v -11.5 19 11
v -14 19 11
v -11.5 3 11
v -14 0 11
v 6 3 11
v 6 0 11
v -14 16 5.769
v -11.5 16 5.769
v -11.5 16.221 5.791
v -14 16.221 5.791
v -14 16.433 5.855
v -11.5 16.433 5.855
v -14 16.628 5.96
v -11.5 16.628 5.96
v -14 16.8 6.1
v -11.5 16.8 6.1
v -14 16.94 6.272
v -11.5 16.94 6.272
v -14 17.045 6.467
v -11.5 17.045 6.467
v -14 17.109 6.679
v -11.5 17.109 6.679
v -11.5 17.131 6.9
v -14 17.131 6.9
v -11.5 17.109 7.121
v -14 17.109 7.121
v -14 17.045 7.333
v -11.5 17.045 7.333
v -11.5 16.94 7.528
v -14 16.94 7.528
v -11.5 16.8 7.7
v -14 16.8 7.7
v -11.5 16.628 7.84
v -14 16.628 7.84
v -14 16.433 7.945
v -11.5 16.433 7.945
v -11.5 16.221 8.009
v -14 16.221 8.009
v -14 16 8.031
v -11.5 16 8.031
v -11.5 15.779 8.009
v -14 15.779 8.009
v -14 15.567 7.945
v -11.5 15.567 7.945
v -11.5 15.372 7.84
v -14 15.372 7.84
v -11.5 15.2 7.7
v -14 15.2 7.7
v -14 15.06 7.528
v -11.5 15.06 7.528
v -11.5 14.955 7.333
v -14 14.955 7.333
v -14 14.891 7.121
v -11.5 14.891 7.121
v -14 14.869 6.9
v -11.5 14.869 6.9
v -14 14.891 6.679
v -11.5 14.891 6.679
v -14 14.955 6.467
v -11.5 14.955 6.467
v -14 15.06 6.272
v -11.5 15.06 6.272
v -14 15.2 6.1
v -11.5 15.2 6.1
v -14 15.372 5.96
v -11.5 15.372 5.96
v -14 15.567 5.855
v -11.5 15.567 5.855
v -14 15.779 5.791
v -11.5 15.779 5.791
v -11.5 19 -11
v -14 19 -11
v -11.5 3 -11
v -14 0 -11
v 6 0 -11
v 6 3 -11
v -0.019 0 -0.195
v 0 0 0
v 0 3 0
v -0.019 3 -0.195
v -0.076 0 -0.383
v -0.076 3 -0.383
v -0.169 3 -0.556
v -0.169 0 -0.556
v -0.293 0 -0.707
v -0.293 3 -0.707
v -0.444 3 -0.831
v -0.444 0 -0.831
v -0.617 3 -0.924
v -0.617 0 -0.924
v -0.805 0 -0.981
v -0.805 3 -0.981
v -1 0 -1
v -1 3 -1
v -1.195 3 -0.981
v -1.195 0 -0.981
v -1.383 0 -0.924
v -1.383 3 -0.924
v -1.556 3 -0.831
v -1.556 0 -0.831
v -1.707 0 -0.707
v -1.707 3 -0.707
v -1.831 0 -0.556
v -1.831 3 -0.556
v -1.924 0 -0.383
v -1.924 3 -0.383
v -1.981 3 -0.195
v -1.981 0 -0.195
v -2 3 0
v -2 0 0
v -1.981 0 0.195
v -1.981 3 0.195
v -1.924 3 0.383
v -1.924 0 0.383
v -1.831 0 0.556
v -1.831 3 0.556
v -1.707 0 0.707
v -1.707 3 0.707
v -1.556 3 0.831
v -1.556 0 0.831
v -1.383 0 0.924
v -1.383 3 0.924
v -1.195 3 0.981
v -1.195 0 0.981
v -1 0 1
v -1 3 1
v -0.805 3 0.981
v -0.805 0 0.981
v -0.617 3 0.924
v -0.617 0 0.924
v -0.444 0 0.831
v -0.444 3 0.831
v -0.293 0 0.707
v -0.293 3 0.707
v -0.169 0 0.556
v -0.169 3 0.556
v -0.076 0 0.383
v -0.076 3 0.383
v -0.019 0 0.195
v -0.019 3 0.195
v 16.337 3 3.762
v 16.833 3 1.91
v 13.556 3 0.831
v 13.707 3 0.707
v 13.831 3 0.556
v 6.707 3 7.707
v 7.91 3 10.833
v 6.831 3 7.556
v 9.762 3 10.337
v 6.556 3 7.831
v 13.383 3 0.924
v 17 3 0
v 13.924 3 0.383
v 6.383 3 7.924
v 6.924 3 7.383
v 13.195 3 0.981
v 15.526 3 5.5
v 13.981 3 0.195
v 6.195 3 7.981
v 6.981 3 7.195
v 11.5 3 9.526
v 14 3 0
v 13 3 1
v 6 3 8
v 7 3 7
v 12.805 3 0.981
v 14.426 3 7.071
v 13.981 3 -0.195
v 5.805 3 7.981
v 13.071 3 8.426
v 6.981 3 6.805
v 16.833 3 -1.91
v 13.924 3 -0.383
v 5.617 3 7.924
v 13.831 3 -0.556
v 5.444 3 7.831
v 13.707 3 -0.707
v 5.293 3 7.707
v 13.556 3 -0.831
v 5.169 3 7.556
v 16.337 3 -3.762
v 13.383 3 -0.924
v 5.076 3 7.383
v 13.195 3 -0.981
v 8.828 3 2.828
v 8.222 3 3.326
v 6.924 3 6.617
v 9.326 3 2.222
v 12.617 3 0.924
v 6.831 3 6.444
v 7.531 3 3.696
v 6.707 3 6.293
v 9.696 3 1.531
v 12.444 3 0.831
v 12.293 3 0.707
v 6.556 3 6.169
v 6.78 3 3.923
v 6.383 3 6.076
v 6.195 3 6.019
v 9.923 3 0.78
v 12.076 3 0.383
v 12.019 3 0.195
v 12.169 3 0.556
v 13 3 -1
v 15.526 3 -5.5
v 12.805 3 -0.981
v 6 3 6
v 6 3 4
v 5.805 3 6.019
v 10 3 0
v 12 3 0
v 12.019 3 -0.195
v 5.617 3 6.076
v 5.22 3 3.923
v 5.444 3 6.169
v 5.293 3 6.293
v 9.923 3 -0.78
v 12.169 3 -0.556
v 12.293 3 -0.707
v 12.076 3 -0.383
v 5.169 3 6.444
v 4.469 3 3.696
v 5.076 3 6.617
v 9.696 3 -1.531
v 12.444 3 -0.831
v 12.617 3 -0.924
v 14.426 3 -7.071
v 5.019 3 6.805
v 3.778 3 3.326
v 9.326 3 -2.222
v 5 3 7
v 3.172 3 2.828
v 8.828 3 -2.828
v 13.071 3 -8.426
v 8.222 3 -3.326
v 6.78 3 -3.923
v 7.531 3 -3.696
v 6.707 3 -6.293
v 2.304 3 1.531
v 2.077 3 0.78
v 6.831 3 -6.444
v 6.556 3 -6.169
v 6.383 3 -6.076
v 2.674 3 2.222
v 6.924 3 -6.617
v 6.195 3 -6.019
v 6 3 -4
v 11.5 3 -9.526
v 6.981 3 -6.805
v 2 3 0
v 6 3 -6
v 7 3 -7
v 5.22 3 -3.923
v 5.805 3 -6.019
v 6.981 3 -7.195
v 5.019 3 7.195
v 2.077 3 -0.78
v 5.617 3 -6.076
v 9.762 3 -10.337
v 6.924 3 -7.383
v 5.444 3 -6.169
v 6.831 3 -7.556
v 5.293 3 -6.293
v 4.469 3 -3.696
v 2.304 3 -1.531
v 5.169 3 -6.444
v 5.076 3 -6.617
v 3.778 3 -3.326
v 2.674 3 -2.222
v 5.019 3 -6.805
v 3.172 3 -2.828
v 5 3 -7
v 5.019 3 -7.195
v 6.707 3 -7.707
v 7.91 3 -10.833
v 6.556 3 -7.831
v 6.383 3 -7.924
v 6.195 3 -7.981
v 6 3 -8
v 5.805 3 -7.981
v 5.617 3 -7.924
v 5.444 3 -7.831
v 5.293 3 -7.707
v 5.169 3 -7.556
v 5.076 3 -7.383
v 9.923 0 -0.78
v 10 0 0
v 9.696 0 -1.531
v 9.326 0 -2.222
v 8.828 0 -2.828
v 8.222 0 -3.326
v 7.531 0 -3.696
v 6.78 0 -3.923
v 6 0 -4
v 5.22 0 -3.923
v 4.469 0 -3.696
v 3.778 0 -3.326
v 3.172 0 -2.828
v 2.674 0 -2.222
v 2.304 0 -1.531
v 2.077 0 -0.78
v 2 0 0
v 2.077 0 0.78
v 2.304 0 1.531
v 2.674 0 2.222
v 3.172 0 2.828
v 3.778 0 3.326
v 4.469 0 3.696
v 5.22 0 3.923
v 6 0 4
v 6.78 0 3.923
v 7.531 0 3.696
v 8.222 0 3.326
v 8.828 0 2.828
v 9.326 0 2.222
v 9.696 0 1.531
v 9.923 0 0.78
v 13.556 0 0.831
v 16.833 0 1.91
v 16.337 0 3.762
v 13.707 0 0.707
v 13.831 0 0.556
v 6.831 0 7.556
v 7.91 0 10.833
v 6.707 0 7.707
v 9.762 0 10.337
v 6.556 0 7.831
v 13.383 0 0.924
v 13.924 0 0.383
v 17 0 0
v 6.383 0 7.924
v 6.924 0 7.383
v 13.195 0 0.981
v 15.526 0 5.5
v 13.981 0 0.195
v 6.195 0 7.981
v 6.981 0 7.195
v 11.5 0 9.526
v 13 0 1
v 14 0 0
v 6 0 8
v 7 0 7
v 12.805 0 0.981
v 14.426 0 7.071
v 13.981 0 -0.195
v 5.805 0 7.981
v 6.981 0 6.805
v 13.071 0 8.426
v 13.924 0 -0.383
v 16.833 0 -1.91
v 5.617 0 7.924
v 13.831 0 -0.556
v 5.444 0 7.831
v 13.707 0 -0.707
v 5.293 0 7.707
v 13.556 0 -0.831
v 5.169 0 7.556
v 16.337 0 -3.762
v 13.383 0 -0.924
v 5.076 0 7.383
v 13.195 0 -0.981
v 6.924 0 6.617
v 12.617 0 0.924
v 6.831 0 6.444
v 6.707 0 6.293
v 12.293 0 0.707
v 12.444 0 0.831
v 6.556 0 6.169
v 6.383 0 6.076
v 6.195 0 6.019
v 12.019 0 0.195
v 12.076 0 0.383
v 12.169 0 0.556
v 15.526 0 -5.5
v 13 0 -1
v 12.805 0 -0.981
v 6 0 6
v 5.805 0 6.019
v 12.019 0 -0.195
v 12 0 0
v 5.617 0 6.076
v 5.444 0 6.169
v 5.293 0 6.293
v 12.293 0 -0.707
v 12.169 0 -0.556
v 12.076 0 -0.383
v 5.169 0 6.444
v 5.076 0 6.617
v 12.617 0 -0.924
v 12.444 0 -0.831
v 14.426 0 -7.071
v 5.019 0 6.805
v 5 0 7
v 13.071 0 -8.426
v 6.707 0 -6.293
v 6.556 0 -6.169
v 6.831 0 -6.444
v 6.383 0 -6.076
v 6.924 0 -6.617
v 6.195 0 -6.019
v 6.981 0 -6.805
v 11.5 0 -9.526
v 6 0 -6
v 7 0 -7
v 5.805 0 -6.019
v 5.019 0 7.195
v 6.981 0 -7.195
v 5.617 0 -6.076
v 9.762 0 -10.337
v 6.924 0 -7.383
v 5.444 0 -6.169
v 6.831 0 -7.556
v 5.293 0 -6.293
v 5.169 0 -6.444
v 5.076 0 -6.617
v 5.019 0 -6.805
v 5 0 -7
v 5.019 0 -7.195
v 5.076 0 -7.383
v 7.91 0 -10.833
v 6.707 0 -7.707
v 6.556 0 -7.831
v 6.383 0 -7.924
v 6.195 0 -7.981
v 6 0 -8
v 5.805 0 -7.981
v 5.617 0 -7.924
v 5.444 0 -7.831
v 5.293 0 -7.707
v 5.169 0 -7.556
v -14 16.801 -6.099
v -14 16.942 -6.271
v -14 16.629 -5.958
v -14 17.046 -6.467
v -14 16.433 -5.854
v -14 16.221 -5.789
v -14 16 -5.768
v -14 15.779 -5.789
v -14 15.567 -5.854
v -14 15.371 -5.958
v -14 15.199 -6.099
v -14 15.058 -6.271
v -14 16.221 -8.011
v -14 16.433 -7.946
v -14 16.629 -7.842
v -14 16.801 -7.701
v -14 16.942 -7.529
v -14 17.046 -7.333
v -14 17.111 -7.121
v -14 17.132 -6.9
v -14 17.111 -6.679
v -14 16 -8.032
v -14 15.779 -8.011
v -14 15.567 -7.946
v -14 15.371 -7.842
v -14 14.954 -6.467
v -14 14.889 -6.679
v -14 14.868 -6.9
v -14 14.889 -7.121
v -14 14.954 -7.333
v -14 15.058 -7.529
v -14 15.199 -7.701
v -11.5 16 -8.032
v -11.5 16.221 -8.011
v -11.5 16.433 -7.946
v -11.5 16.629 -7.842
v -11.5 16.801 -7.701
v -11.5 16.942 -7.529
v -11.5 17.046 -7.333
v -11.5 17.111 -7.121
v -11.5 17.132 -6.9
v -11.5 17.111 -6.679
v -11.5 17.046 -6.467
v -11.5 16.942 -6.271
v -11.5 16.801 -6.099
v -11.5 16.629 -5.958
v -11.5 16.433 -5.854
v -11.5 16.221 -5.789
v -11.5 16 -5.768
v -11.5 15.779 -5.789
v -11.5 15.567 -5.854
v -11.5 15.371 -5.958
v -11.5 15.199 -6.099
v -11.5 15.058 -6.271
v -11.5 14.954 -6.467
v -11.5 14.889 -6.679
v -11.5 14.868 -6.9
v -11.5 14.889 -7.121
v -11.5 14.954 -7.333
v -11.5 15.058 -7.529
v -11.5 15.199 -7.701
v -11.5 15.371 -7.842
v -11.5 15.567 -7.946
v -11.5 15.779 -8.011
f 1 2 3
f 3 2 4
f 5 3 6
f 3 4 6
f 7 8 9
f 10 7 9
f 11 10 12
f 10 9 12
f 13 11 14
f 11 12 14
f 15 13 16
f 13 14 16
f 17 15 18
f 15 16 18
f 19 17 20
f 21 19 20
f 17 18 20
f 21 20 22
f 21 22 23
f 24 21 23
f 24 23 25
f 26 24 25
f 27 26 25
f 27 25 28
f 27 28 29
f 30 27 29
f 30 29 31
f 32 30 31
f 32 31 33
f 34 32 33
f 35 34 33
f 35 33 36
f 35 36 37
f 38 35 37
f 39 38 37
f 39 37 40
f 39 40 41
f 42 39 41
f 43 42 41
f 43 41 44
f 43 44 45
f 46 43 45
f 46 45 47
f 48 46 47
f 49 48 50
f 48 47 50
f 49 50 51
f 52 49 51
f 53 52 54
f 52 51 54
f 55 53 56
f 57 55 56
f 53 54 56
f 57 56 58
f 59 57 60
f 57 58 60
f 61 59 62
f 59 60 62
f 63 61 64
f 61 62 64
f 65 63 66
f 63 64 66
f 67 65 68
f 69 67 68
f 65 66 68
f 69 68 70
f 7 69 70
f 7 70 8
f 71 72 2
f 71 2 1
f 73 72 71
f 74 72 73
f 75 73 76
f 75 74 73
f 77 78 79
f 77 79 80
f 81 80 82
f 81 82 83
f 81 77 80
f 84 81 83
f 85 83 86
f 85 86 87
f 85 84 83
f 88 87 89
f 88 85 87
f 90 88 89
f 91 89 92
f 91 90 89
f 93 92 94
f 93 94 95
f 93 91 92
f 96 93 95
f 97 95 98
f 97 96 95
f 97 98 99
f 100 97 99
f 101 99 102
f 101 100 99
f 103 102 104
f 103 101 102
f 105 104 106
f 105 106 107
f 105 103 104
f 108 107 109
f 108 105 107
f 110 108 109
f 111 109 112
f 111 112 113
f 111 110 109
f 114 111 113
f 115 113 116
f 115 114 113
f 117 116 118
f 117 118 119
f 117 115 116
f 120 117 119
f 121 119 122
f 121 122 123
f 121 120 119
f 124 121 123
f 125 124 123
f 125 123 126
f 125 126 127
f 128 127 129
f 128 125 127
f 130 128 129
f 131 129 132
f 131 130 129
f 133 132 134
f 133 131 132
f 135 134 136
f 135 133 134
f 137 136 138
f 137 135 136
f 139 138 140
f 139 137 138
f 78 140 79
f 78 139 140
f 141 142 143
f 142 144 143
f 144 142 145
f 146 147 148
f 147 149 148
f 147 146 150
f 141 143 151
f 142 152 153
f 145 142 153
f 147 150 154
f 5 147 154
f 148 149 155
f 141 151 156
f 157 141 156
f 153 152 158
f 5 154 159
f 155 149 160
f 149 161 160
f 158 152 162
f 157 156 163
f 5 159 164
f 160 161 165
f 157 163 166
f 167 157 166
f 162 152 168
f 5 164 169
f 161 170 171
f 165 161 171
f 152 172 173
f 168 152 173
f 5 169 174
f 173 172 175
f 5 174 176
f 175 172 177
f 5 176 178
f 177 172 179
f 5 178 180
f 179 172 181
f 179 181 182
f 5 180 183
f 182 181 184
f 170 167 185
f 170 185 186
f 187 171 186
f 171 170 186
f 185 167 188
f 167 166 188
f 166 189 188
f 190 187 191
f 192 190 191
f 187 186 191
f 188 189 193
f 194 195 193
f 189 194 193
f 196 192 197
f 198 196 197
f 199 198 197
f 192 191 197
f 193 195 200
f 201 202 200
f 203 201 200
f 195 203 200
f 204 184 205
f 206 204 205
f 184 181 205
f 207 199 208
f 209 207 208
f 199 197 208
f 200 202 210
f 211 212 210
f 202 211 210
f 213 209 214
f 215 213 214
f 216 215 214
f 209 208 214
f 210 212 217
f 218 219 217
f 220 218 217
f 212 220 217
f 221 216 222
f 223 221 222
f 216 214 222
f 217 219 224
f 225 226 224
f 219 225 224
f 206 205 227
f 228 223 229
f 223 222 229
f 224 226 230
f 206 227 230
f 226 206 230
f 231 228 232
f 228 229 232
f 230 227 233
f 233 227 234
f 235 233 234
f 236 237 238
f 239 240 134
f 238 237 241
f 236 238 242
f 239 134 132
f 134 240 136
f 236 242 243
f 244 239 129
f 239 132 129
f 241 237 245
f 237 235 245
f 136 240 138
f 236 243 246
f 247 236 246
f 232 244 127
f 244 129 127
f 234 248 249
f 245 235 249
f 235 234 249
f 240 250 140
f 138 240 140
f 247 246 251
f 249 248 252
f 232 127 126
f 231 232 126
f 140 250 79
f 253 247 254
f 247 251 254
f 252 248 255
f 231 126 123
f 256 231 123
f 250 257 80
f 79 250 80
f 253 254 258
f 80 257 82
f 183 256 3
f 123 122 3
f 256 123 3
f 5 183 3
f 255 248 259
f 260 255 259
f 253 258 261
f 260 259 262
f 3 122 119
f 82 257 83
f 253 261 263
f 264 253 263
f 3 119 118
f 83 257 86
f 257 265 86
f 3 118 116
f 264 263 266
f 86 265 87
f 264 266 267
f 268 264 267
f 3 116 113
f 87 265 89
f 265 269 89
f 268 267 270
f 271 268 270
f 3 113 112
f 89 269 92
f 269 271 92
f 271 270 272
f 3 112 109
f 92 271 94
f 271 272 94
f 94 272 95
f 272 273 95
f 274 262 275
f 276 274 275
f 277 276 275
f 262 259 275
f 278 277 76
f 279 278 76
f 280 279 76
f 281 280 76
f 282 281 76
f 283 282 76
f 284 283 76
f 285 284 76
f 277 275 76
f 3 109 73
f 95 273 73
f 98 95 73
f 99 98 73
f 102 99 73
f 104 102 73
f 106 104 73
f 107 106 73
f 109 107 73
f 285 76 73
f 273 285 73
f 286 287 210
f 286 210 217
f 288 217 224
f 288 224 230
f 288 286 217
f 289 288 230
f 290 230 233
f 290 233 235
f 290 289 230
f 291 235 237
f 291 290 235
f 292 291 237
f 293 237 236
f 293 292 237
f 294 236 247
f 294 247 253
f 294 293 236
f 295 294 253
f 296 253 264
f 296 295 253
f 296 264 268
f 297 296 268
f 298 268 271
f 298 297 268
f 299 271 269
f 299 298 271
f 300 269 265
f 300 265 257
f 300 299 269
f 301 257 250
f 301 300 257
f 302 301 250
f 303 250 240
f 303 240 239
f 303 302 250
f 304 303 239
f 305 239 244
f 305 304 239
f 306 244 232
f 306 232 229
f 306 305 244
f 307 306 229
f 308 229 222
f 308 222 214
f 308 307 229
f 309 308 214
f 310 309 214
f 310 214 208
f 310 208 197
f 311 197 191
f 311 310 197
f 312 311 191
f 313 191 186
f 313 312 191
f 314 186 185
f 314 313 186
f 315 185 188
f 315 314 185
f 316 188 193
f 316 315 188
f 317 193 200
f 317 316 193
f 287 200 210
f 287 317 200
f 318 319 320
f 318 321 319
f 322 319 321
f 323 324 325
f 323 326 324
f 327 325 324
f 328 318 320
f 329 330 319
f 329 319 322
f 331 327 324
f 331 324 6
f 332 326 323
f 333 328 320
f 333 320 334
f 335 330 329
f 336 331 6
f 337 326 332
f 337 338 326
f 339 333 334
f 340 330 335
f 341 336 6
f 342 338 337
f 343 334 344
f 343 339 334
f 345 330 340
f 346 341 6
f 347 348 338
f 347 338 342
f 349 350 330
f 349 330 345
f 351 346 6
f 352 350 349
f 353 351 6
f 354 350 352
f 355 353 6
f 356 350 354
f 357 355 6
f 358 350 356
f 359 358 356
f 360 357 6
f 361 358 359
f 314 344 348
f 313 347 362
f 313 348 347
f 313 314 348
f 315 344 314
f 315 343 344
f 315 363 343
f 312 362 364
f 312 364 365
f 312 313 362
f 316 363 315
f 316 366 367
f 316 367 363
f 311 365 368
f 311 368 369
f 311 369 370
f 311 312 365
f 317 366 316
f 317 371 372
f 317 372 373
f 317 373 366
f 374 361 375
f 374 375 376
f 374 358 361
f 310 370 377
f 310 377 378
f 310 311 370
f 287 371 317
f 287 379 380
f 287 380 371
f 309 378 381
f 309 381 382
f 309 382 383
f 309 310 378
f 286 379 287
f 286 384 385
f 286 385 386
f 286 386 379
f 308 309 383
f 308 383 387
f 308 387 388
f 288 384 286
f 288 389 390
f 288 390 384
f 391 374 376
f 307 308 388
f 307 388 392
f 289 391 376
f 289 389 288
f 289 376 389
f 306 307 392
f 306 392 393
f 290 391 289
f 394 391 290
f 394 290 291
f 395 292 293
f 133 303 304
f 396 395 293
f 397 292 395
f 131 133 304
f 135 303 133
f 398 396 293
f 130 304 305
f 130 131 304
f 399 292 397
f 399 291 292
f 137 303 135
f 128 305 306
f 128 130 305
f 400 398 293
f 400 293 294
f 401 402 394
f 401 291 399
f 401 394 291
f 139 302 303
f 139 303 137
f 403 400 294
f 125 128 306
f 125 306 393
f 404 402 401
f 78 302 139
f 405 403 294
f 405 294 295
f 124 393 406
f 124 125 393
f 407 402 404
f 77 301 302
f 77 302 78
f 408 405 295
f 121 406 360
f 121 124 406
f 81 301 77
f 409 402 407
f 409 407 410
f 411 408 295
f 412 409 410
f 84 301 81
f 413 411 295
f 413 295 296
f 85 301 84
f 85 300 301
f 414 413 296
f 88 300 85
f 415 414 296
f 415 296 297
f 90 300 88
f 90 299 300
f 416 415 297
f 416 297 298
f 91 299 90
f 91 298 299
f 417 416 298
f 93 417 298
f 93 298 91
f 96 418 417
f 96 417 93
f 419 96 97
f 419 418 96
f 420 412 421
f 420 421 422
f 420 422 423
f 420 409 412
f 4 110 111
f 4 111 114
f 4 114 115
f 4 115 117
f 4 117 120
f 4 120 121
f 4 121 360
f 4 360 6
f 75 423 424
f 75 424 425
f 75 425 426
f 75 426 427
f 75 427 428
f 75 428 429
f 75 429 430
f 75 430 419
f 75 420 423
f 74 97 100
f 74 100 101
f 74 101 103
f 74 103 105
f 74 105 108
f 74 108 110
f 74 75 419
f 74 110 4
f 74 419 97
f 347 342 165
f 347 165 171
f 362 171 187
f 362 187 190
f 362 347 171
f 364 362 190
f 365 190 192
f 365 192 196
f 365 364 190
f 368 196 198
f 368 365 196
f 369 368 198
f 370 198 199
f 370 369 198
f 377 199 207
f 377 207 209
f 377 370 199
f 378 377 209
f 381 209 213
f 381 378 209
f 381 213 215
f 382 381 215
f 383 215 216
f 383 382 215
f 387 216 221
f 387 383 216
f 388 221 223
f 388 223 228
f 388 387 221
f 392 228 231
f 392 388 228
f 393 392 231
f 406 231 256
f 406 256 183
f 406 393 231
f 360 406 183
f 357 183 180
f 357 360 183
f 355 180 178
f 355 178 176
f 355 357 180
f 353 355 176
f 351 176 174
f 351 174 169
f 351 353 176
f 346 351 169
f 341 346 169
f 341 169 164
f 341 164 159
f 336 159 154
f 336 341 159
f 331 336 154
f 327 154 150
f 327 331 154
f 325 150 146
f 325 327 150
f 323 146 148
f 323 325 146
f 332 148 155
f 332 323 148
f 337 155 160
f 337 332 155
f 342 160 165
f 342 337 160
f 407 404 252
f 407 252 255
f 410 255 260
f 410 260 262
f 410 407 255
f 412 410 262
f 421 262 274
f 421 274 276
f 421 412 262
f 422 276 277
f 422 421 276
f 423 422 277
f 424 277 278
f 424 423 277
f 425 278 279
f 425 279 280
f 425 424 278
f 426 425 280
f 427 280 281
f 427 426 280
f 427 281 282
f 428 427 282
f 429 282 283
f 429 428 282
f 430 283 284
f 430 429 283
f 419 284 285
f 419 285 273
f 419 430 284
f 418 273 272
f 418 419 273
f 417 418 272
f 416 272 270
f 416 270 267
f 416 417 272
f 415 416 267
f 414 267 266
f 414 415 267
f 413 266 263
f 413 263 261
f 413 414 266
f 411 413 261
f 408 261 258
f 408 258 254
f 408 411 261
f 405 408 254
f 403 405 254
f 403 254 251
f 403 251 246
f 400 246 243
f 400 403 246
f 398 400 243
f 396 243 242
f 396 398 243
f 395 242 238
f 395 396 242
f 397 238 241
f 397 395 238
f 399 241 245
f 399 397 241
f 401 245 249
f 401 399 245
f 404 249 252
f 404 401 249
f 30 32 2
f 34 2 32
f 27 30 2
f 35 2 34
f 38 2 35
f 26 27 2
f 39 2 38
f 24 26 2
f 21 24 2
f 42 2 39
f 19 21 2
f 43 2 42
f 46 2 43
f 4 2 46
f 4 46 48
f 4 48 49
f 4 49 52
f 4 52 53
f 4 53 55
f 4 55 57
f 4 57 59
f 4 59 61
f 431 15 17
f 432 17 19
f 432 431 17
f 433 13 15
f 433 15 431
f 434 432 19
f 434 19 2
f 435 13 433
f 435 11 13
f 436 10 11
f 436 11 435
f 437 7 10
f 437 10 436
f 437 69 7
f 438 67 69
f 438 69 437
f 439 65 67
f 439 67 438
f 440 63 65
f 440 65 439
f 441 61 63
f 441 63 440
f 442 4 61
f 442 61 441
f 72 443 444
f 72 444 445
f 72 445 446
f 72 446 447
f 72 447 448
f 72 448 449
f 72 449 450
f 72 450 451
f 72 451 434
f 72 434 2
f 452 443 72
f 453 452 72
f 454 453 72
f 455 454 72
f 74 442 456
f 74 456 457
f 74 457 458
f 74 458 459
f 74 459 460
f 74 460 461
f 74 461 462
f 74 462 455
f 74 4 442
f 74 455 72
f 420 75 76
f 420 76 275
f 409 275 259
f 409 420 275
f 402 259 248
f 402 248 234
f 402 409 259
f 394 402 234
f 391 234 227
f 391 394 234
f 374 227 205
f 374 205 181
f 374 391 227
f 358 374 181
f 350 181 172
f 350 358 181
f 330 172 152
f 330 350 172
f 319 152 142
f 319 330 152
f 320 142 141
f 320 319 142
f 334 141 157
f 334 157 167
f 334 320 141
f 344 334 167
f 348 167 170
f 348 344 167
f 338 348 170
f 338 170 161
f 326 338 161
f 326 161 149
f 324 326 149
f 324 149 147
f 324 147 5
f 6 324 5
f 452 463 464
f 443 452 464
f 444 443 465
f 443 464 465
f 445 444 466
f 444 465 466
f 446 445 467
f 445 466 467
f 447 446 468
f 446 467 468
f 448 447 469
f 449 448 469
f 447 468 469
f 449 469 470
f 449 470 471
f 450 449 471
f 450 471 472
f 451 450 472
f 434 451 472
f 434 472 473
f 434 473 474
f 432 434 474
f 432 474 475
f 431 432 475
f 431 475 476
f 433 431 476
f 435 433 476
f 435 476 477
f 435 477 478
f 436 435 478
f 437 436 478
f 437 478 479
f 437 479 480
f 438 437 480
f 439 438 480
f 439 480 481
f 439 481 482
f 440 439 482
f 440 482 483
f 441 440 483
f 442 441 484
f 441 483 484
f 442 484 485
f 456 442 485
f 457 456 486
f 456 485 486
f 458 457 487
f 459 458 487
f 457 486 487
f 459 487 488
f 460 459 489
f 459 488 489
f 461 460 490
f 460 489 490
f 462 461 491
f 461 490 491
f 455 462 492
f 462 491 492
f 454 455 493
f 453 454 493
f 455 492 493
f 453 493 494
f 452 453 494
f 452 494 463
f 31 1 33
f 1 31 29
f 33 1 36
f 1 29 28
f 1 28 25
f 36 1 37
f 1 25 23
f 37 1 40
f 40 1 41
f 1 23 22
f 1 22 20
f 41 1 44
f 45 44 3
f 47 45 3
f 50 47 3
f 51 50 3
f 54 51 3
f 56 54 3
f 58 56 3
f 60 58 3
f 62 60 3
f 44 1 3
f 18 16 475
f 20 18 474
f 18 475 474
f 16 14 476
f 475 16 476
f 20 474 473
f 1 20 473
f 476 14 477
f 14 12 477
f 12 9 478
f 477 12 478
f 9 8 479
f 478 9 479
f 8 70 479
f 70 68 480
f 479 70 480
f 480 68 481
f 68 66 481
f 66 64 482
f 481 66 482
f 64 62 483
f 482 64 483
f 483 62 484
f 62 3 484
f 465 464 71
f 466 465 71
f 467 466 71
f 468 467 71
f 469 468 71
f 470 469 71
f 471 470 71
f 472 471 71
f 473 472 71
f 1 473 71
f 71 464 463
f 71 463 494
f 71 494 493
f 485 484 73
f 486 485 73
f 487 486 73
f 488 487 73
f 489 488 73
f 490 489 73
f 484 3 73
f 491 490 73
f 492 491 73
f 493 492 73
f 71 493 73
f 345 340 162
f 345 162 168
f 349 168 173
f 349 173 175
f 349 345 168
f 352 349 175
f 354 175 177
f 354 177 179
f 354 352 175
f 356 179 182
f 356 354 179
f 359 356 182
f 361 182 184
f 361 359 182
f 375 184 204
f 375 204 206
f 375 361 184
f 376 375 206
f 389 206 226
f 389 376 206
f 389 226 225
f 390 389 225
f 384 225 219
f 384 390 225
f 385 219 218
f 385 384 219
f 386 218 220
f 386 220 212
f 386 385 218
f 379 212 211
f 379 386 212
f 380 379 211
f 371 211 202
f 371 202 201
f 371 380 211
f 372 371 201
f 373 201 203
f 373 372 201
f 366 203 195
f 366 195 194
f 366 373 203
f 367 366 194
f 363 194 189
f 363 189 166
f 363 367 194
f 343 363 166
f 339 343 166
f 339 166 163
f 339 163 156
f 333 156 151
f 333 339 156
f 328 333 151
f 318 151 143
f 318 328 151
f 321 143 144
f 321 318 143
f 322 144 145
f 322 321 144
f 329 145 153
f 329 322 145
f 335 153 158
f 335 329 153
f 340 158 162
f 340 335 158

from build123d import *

# Parameters (mm, degrees)
SKETCH1_R           = 1
SKETCH1_R_2         = 4
BOSS_EXTRUDE1_DEPTH = 3
SKETCH2_W           = 2.5
SKETCH2_H           = 22
BOSS_EXTRUDE2_DEPTH = 16
SKETCH3_R           = 1.132393425
SKETCH3_R_2         = 1.130977438
CUT_EXTRUDE1_DEPTH  = 6


with BuildPart() as part:
    # Sketch1 → Boss-Extrude1 (new body)
    with BuildSketch(Plane(origin=(0, 0, 0), x_dir=(1, 0, 0), z_dir=(0, 1, 0))):
        with BuildLine():
            Line((-14, -11), (-14, 11))
            Line((-14, 11), (6, 11))
            ThreePointArc((6, 11), (17, 0), (6, -11))
            Line((6, -11), (-14, -11))
        make_face()
        with Locations((6, -7)):
            Circle(SKETCH1_R, mode=Mode.SUBTRACT)
        with Locations((-1, 0)):
            Circle(SKETCH1_R, mode=Mode.SUBTRACT)
        with Locations((6, 0)):
            Circle(SKETCH1_R_2, mode=Mode.SUBTRACT)
        with Locations((13, 0)):
            Circle(SKETCH1_R, mode=Mode.SUBTRACT)
        with Locations((6, 7)):
            Circle(SKETCH1_R, mode=Mode.SUBTRACT)
    extrude(amount=BOSS_EXTRUDE1_DEPTH)

    # Sketch2 → Boss-Extrude2 (add)
    with BuildSketch(Plane(origin=(0, 3, 0), x_dir=(1, 0, 0), z_dir=(0, 1, 0))):
        with Locations((-12.75, 0)):
            Rectangle(SKETCH2_W, SKETCH2_H)
    extrude(amount=BOSS_EXTRUDE2_DEPTH)

    # Sketch3 → Cut-Extrude1 (cut)
    with BuildSketch(Plane(origin=(-11.5, 0, 0), x_dir=(0, 0, -1), z_dir=(1, 0, 0))):
        with Locations((6.9, 16)):
            Circle(SKETCH3_R)
        with Locations((-6.9, 16)):
            Circle(SKETCH3_R_2)
    extrude(amount=-CUT_EXTRUDE1_DEPTH, mode=Mode.SUBTRACT)


solid = part.part
